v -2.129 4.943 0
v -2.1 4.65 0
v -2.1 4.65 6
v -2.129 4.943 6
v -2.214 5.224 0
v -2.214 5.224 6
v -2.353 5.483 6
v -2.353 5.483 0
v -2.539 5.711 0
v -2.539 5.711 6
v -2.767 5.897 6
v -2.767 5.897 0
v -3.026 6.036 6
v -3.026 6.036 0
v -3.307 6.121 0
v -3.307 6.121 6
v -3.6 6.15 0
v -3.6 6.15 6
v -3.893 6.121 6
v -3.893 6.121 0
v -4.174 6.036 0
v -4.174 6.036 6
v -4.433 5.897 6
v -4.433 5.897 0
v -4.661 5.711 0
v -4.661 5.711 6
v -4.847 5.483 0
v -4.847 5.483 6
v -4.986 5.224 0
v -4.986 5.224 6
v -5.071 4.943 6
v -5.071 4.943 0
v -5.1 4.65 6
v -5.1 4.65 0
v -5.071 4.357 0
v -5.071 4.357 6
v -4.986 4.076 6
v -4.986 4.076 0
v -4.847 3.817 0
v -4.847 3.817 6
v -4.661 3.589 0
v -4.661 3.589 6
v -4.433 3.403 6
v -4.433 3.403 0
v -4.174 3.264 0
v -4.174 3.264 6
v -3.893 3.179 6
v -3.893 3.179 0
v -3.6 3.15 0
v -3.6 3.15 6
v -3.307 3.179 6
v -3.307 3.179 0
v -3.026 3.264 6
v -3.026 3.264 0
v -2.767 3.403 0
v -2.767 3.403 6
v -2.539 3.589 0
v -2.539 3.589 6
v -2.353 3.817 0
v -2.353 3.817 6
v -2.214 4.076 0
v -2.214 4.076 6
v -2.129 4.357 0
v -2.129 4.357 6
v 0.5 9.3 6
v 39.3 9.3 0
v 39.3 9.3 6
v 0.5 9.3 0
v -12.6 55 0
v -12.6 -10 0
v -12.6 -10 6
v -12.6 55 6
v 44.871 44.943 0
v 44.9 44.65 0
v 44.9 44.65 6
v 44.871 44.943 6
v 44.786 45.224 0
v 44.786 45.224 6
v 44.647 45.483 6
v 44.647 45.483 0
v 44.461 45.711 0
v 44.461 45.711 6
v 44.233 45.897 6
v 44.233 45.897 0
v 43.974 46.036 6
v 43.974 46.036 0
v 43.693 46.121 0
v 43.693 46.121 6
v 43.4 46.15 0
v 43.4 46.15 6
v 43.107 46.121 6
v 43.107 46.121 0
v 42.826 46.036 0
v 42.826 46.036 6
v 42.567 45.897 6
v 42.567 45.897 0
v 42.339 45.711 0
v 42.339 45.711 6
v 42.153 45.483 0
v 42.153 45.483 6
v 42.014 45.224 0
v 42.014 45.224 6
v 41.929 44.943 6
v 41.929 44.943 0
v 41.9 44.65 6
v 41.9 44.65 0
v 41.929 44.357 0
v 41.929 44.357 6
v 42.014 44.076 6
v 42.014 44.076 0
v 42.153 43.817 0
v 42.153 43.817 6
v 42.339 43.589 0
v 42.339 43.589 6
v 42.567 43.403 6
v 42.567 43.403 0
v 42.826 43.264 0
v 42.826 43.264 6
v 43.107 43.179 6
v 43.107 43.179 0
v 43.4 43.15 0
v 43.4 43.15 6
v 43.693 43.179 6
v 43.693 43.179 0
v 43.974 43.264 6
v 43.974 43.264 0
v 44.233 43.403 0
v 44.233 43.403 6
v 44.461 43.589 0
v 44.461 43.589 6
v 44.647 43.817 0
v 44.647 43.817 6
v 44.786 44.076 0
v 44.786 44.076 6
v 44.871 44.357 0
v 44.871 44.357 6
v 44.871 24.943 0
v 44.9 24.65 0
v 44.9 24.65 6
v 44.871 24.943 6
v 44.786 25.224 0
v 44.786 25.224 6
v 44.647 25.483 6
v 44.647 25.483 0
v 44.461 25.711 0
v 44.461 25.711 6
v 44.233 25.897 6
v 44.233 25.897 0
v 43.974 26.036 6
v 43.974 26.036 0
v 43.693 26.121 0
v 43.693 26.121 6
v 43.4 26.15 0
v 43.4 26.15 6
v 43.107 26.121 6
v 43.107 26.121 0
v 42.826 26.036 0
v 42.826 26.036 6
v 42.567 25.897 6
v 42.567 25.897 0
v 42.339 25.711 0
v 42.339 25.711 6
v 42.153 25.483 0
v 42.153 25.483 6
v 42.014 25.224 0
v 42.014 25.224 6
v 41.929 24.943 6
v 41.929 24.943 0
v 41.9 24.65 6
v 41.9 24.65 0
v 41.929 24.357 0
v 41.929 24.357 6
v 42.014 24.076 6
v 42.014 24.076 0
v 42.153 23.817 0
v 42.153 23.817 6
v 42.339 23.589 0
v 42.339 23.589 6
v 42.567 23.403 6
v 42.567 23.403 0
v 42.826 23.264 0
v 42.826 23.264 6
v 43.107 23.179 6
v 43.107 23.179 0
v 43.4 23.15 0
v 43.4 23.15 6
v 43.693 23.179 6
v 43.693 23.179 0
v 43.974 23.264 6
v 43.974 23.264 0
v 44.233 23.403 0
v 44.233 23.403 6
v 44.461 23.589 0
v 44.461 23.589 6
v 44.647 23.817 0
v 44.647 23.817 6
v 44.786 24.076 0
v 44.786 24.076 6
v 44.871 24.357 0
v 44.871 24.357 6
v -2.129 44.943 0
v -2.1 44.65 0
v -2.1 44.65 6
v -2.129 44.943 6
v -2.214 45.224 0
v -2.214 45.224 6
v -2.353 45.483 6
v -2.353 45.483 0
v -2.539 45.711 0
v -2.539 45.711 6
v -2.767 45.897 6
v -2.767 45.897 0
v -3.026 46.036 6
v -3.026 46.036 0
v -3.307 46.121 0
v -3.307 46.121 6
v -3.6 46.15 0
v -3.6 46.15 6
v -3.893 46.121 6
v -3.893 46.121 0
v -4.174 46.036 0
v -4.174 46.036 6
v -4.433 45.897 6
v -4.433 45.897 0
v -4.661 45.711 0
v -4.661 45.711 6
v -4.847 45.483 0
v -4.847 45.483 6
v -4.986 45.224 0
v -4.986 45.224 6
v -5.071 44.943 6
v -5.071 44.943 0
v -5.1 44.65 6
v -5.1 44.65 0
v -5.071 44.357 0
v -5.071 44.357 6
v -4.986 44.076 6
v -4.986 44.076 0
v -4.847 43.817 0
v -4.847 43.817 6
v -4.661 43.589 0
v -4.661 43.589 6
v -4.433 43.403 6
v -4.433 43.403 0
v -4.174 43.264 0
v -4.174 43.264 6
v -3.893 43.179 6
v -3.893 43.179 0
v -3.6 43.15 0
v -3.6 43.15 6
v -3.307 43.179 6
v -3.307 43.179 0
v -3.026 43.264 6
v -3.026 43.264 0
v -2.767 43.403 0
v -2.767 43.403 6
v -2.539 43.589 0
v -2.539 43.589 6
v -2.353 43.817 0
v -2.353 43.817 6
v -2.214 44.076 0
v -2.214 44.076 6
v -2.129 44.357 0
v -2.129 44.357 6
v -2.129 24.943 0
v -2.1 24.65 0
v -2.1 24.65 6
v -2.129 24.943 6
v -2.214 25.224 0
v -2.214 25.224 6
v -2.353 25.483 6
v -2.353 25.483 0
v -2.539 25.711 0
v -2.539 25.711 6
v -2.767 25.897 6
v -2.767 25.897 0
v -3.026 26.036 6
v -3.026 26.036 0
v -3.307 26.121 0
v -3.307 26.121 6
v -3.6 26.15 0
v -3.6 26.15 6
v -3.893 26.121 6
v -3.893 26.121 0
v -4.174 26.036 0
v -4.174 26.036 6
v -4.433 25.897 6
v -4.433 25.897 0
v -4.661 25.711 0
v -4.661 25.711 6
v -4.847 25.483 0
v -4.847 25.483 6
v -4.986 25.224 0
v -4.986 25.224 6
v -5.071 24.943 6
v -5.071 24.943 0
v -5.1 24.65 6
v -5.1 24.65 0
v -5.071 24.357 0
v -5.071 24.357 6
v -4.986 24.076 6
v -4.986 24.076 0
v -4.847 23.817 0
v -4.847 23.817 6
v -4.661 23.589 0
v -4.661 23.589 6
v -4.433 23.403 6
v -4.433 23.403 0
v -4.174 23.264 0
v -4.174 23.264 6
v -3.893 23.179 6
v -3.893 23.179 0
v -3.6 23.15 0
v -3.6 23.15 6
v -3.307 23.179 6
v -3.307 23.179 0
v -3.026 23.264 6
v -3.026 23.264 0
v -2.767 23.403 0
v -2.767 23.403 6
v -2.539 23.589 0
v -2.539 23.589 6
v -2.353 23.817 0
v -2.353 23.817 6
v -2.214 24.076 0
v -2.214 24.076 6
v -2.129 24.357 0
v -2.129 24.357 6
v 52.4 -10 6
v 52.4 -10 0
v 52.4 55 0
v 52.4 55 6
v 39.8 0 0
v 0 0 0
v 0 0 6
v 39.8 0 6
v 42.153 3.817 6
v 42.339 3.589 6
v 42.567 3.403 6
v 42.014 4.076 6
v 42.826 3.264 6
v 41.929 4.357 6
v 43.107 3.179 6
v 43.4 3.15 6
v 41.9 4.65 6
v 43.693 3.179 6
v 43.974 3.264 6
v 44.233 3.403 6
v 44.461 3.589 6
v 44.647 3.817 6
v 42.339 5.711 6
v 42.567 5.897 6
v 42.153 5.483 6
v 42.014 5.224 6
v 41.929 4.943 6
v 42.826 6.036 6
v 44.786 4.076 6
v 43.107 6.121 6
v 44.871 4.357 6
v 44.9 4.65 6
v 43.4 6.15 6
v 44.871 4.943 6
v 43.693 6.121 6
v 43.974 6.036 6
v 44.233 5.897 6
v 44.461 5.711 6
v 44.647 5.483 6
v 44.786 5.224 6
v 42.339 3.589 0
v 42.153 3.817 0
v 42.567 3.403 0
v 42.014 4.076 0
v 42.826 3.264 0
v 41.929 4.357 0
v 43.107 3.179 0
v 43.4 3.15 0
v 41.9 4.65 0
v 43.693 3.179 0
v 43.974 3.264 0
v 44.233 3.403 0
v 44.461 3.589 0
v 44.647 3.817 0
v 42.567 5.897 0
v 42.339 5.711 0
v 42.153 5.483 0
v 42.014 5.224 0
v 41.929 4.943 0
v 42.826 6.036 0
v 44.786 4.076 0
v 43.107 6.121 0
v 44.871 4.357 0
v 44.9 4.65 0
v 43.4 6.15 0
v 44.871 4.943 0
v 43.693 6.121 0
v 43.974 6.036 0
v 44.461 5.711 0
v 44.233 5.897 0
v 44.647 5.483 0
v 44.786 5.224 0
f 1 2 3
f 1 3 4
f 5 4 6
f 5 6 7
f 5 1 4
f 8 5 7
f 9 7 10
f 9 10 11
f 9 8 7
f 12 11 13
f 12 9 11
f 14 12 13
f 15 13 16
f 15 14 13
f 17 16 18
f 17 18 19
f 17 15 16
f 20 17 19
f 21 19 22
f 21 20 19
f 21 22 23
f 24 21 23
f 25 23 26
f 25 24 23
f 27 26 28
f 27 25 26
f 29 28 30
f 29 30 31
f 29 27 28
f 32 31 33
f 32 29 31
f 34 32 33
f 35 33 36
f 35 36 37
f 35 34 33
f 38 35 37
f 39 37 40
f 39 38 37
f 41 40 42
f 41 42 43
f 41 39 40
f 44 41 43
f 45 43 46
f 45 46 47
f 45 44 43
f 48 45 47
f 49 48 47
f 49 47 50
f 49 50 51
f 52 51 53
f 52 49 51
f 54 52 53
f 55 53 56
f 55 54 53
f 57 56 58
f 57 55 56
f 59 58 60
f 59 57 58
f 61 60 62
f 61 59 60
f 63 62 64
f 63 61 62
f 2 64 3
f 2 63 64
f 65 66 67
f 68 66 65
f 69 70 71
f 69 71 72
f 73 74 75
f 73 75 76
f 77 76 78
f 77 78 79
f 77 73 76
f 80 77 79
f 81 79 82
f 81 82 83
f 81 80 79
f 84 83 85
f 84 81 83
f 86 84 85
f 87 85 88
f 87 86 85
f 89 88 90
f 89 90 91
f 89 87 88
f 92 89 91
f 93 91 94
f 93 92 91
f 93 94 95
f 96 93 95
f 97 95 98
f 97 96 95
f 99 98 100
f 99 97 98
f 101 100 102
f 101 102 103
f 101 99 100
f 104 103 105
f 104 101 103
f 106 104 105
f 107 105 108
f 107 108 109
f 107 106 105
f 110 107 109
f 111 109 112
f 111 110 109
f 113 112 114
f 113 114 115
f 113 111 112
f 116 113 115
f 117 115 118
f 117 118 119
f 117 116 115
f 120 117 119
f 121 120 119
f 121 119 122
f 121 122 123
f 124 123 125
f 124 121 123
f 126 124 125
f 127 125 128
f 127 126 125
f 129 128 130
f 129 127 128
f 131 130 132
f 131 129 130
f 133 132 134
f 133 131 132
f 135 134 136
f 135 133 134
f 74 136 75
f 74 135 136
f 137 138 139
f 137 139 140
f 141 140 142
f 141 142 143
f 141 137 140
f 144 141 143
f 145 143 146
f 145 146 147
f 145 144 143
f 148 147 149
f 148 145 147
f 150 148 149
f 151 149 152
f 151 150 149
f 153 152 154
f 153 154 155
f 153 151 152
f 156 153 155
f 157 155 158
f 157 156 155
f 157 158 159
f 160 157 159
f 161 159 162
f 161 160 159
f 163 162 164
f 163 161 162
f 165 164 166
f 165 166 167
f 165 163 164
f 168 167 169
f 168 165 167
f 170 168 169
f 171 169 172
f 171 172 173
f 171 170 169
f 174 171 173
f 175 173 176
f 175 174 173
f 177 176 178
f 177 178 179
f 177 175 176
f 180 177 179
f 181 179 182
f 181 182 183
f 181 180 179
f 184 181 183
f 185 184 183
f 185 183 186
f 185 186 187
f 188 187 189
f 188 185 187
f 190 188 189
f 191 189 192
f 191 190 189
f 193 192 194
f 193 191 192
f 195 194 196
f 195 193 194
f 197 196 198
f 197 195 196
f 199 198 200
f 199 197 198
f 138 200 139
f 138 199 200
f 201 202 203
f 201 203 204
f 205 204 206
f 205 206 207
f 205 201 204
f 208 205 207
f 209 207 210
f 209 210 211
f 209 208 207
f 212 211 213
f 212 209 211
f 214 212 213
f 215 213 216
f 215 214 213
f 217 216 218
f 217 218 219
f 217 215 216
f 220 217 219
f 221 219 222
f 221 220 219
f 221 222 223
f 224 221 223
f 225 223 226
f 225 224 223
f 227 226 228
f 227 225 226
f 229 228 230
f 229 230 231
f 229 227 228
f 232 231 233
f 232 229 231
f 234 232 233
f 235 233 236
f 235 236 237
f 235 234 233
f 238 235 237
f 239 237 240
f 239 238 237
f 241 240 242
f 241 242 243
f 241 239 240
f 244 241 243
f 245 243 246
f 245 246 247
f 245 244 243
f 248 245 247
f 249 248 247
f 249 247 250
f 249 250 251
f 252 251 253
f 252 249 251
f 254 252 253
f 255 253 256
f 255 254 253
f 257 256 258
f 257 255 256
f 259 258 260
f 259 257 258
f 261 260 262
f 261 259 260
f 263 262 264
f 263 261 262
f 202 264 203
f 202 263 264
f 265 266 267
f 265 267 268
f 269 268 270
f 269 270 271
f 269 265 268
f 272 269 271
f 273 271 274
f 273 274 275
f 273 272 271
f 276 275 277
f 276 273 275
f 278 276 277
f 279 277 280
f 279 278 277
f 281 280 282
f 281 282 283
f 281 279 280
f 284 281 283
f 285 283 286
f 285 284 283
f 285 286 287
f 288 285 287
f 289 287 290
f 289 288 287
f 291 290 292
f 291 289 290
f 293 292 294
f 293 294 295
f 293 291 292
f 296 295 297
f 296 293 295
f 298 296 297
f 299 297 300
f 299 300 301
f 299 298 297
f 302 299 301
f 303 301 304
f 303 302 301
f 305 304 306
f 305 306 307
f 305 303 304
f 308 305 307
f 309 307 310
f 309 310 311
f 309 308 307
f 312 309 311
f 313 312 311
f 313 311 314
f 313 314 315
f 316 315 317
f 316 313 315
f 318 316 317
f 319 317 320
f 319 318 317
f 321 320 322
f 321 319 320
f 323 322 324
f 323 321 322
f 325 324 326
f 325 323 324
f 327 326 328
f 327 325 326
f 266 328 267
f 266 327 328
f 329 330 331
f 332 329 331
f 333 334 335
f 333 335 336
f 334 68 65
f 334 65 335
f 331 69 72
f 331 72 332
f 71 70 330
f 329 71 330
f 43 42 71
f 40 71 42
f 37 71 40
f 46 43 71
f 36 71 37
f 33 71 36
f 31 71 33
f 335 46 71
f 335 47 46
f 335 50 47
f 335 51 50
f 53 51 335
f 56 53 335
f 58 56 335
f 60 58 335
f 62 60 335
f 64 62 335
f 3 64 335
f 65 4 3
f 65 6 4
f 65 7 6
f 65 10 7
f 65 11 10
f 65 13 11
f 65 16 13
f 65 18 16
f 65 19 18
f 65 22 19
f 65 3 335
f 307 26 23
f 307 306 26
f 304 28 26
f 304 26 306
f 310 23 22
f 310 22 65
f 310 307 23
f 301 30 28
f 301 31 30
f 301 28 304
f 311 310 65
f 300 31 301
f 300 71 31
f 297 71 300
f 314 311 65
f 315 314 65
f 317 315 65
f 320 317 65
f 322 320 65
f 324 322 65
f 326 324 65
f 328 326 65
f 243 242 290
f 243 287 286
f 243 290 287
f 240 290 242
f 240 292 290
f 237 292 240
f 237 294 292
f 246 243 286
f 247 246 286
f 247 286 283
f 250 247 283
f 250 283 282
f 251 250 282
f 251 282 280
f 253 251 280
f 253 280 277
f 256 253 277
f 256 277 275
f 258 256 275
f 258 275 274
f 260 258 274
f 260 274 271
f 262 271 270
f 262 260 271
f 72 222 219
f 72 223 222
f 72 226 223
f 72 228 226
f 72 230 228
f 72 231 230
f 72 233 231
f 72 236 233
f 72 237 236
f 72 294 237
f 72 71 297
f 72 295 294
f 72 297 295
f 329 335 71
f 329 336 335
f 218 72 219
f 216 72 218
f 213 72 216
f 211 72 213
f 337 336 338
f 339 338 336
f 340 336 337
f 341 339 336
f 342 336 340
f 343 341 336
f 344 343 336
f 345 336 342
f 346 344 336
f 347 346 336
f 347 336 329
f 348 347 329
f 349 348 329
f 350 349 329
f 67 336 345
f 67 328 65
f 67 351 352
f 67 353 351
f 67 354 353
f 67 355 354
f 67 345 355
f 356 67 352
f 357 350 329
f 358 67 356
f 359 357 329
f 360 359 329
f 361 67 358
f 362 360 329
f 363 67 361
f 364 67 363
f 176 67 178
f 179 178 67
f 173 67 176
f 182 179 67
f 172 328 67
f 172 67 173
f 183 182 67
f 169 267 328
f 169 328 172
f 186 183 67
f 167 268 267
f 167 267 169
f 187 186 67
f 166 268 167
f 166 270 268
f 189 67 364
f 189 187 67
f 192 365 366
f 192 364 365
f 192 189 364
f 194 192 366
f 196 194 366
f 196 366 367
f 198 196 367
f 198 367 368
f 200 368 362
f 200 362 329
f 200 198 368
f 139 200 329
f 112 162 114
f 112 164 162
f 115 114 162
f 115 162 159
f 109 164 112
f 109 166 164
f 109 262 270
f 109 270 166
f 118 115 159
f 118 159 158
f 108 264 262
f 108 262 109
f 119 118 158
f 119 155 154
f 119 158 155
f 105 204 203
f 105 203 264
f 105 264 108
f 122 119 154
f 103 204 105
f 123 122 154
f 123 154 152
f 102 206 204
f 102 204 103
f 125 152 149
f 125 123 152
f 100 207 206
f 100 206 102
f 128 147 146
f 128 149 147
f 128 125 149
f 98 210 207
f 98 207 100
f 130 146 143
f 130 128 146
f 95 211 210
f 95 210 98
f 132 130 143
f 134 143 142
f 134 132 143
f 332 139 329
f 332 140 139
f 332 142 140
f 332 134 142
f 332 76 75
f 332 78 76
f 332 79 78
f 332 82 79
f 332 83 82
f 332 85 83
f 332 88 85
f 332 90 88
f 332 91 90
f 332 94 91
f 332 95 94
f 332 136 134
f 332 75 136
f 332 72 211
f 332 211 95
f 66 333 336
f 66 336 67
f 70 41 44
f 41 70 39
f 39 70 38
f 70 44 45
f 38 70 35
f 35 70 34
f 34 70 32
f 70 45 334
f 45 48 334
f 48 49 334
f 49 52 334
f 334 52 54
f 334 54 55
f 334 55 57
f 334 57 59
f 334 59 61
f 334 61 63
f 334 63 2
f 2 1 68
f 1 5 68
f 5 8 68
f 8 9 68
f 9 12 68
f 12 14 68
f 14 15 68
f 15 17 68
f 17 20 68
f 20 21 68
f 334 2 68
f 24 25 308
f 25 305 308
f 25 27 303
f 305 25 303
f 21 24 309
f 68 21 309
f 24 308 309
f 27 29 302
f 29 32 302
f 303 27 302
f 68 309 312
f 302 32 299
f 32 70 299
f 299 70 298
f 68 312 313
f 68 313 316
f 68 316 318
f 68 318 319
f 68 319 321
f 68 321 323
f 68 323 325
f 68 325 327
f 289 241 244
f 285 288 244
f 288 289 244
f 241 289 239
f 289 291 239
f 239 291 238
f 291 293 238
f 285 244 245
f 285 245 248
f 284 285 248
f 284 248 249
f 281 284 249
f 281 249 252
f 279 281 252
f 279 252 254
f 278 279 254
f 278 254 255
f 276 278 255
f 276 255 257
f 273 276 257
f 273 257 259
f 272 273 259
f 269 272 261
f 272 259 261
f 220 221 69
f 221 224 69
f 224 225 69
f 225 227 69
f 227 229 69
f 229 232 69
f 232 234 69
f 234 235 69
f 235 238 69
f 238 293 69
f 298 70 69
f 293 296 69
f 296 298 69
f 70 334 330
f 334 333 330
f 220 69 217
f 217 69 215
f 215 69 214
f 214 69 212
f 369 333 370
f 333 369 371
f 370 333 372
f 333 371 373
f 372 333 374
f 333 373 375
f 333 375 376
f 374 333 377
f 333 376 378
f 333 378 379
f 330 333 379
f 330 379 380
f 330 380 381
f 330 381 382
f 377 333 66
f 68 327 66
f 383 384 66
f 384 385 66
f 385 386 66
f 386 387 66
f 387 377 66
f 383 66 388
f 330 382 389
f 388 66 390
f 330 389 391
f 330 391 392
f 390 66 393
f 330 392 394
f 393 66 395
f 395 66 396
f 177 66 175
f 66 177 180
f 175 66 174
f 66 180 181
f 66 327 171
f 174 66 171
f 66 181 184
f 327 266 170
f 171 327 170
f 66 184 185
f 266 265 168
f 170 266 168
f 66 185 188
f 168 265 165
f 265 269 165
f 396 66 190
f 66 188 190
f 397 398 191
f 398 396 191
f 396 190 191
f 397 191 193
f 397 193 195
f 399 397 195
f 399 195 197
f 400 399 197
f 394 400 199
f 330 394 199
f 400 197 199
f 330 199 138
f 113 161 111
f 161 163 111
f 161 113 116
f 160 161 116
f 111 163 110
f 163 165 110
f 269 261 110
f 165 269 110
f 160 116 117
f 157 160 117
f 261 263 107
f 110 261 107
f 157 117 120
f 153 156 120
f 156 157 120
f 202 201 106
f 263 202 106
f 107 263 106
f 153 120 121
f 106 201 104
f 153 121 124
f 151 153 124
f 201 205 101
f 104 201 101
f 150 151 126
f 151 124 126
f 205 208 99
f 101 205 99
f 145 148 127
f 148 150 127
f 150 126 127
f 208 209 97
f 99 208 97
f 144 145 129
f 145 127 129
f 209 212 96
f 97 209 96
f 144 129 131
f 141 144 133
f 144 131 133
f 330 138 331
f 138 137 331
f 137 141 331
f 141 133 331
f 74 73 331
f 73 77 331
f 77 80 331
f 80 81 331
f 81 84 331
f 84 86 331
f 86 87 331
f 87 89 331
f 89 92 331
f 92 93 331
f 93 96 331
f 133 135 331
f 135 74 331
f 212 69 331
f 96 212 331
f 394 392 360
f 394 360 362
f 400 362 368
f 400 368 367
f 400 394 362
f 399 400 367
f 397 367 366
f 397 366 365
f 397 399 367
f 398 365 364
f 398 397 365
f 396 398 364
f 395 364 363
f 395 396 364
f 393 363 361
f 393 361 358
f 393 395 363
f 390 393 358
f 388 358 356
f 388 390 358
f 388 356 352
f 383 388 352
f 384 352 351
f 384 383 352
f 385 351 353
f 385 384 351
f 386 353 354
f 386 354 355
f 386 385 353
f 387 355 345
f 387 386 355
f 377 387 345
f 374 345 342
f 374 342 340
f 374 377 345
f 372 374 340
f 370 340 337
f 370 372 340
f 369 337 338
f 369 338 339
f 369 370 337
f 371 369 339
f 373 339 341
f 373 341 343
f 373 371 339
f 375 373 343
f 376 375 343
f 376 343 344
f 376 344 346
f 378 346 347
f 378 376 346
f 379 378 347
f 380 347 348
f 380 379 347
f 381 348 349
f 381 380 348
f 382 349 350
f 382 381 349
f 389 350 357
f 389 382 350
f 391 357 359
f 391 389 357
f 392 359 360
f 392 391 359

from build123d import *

# Parameters (mm, degrees)
SKETCH1_W           = 65
SKETCH1_H           = 65
SKETCH1_R           = 1.5
BOSS_EXTRUDE1_DEPTH = 6


with BuildPart() as part:
    # Sketch1 → Boss-Extrude1 (new body)
    with BuildSketch(Plane.XY):
        with Locations((19.9, 22.5)):
            Rectangle(SKETCH1_W, SKETCH1_H)
        with Locations((-3.6, 4.65)):
            Circle(SKETCH1_R, mode=Mode.SUBTRACT)
        with Locations((43.4, 4.65)):
            Circle(SKETCH1_R, mode=Mode.SUBTRACT)
        with Locations((-3.6, 24.65)):
            Circle(SKETCH1_R, mode=Mode.SUBTRACT)
        with Locations((43.4, 24.65)):
            Circle(SKETCH1_R, mode=Mode.SUBTRACT)
        with Locations((-3.6, 44.65)):
            Circle(SKETCH1_R, mode=Mode.SUBTRACT)
        with Locations((43.4, 44.65)):
            Circle(SKETCH1_R, mode=Mode.SUBTRACT)
        Polygon((0, 0), (39.8, 0), (39.3, 9.3), (0.5, 9.3), align=None, mode=Mode.SUBTRACT)
    extrude(amount=BOSS_EXTRUDE1_DEPTH)


solid = part.part
